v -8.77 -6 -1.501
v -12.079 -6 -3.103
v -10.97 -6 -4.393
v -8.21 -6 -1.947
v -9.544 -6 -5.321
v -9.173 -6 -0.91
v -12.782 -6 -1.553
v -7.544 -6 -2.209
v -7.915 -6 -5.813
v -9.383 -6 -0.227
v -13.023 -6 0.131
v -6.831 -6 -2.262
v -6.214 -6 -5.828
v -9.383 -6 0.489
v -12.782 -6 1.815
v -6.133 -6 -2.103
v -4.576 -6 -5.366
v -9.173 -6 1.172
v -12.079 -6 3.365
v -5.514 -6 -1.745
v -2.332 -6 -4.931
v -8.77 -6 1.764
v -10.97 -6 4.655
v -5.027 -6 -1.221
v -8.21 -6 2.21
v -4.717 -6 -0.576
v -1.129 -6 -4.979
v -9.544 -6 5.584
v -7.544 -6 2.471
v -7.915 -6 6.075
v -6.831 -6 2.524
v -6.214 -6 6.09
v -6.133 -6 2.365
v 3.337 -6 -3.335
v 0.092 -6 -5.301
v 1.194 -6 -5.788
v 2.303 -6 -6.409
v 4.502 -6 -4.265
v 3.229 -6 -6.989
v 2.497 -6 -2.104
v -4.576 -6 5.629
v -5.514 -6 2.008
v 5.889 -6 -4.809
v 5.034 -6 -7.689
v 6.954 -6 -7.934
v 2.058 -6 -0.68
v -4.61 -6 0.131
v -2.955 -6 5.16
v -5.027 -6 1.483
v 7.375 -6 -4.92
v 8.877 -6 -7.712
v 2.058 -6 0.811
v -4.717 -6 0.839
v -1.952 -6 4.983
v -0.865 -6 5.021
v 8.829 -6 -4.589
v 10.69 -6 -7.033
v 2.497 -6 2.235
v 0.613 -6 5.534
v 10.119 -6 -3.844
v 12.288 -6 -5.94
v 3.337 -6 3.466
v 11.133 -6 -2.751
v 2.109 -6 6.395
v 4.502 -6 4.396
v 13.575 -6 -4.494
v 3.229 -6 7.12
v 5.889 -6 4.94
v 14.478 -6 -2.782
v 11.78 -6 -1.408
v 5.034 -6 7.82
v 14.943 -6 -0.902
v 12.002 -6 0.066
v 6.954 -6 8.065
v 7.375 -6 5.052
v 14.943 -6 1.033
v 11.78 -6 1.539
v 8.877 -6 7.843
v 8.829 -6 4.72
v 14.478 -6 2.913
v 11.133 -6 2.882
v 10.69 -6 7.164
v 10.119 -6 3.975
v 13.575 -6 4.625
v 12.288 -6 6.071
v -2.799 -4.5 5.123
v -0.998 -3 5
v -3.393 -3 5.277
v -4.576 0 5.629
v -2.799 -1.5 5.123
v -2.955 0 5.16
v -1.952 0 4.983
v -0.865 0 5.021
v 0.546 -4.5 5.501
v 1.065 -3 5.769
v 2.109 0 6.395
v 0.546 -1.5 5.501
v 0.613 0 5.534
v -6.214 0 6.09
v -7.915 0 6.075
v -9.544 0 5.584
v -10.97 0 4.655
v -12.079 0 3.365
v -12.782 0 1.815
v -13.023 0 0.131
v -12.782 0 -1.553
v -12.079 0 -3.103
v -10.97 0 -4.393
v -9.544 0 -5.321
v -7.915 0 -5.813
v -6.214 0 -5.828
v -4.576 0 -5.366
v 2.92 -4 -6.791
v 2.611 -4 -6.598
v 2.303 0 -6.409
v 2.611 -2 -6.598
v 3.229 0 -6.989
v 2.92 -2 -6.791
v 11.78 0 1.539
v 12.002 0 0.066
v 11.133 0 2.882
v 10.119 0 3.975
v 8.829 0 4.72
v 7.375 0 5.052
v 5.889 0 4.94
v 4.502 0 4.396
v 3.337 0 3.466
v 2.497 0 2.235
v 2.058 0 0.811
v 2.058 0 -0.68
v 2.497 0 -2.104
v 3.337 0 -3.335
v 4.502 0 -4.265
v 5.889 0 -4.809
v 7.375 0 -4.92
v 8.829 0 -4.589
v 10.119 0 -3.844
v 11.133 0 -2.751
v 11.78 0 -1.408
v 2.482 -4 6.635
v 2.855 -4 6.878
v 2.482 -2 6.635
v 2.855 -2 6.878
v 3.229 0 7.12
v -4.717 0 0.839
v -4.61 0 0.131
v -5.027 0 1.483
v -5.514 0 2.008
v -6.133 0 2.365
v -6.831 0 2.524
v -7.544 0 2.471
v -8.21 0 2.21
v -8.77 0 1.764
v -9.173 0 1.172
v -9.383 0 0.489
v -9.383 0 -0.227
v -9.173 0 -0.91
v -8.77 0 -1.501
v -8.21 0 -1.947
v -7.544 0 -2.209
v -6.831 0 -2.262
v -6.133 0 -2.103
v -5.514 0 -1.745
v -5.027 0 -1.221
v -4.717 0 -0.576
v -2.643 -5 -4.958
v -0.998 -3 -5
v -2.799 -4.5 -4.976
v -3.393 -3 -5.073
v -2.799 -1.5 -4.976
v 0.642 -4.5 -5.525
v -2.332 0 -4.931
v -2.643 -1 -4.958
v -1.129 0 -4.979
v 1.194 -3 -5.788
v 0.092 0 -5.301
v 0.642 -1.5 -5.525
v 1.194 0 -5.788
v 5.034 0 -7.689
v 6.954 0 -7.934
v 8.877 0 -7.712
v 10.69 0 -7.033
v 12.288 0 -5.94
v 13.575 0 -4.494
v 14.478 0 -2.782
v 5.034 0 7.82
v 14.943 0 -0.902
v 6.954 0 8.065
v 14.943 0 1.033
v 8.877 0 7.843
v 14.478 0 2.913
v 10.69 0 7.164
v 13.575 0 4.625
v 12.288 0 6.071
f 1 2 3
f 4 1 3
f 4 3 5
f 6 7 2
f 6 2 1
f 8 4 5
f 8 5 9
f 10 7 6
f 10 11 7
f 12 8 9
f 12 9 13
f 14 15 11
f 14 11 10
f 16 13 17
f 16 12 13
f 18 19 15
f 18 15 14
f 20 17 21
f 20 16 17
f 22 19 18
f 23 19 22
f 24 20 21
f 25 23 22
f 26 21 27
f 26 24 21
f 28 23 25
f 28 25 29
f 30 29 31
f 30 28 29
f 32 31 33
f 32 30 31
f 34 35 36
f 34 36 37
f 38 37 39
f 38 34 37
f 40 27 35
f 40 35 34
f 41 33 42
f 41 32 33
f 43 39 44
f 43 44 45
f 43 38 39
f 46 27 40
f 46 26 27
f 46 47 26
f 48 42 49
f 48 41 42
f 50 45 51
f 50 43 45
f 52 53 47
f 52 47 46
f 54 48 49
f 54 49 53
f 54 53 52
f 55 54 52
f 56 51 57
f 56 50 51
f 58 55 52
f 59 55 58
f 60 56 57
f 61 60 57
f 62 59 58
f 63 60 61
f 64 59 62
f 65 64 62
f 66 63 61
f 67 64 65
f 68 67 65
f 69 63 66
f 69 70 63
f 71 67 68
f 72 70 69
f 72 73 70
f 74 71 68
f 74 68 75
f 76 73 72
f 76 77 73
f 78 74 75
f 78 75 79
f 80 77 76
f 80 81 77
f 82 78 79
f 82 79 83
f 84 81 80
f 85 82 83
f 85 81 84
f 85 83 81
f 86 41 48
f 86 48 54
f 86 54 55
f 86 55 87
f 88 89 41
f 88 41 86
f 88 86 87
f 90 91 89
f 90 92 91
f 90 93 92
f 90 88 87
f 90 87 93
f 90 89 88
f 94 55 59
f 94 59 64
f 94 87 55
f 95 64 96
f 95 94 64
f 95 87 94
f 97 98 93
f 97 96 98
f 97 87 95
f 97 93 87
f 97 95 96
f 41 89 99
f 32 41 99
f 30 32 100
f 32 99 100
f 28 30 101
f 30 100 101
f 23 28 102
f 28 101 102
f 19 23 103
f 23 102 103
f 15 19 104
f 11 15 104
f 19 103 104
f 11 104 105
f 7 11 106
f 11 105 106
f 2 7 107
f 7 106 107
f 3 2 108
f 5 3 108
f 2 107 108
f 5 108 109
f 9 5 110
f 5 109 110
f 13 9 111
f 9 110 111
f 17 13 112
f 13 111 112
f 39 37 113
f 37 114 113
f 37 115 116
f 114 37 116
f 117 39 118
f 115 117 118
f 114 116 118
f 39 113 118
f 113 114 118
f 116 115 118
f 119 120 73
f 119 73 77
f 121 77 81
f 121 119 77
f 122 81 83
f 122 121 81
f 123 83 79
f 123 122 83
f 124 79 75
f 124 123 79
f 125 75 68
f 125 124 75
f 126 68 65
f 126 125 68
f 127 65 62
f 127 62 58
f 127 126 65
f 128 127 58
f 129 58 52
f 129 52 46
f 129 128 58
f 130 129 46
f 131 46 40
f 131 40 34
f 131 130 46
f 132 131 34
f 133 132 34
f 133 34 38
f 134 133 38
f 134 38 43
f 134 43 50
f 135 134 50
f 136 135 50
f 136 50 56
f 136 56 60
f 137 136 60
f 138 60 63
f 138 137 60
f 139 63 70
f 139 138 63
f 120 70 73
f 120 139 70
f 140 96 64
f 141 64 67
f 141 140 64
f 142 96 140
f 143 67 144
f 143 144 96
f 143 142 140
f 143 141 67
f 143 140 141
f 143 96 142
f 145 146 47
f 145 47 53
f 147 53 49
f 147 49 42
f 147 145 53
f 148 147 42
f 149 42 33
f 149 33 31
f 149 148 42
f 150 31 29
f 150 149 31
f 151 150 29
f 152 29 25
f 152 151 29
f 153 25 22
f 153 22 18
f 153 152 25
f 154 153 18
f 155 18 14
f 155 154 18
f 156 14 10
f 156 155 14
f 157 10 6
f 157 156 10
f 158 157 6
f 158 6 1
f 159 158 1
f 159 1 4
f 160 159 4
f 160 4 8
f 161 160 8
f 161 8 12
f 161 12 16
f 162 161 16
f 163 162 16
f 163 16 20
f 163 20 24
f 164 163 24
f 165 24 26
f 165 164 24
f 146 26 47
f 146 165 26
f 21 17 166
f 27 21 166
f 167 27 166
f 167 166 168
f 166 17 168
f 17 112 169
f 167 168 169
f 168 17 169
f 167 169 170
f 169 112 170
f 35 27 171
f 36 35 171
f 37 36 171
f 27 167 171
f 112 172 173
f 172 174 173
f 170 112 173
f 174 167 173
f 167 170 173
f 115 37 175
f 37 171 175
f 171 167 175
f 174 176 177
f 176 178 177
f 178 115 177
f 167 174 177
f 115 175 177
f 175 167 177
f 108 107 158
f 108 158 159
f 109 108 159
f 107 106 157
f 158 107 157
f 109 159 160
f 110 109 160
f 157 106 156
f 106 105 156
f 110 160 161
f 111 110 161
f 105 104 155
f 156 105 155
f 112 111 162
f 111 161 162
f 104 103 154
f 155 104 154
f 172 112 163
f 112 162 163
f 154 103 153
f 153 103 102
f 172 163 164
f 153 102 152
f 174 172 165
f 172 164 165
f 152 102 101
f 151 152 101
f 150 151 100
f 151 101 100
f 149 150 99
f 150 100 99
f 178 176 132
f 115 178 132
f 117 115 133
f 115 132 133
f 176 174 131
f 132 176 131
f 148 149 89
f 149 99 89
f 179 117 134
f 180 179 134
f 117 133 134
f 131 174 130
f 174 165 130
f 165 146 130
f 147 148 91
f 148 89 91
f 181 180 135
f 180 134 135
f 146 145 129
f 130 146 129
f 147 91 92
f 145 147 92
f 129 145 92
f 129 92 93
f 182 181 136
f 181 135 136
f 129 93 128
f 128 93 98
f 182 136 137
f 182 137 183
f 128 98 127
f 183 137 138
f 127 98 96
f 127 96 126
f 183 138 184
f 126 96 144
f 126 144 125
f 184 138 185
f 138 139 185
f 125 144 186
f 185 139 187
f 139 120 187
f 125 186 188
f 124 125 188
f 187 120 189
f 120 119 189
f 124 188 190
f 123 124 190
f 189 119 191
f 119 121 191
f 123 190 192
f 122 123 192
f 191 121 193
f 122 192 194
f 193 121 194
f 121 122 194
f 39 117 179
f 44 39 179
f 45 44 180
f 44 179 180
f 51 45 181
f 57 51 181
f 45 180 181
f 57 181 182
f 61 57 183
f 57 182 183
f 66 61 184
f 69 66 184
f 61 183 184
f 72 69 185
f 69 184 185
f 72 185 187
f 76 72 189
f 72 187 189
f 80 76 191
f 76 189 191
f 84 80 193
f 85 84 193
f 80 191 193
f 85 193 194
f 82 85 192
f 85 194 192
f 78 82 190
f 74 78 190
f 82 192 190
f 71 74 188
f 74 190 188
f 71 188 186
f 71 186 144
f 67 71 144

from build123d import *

# Parameters (mm, degrees)
F0_R     = 2.4
F0_R_2   = 5
F1_DEPTH = 6


with BuildPart() as f1:
    # F0 (on Front) → F1 (new body)
    with BuildSketch(Plane.XZ):
        with BuildLine():
            add(Edge.make_bspline(
                [(-4.5759957999, -5.3663848974), (-3.3944030614, -5.0263522526), (-1.1564816937, -4.5735976346), (1.1915972707, -5.7397107149), (2.3027864337, -6.4089476665)],
                knots=[0, 0, 0, 0, 0.4673689741, 0.8842484986, 0.8842484986, 0.8842484986, 0.8842484986], degree=3))
            add(Edge.make_bspline(
                [(2.3027864337, -6.4089476665), (2.6113211695, -6.5947691746), (2.9201786156, -6.7898015167), (3.2289242512, -6.9888996834)],
                knots=[0.8842484986, 0.8842484986, 0.8842484986, 0.8842484986, 1, 1, 1, 1], degree=3))
            ThreePointArc((3.2289242512, -6.9888996834), (15.001806232, 0.0655571744), (3.2289242512, 7.1200140322))
            add(Edge.make_bspline(
                [(2.1087657664, 6.3947083815), (2.4816893958, 6.631967091), (2.8553011873, 6.8792507811), (3.2289242512, 7.1200140322)],
                knots=[0.8599364178, 0.8599364178, 0.8599364178, 0.8599364178, 1, 1, 1, 1], degree=3))
            add(Edge.make_bspline(
                [(-4.5759957999, 5.628613595), (-3.3951999873, 5.2883114962), (-1.214946794, 4.4452120066), (1.0628103891, 5.729258398), (2.1087657664, 6.3947083815)],
                knots=[0, 0, 0, 0, 0.4670939015, 0.8599364178, 0.8599364178, 0.8599364178, 0.8599364178], degree=3))
            ThreePointArc((-4.5759957999, 5.628613595), (-13.022586423, 0.1311143488), (-4.5759957999, -5.3663848974))
        make_face()
        with Locations((-7.0102557888, 0.1311143488)):
            Circle(F0_R, mode=Mode.SUBTRACT)
        with Locations((7.001806232, 0.0655571744)):
            Circle(F0_R_2, mode=Mode.SUBTRACT)
    extrude(amount=F1_DEPTH)


solid = f1.part
